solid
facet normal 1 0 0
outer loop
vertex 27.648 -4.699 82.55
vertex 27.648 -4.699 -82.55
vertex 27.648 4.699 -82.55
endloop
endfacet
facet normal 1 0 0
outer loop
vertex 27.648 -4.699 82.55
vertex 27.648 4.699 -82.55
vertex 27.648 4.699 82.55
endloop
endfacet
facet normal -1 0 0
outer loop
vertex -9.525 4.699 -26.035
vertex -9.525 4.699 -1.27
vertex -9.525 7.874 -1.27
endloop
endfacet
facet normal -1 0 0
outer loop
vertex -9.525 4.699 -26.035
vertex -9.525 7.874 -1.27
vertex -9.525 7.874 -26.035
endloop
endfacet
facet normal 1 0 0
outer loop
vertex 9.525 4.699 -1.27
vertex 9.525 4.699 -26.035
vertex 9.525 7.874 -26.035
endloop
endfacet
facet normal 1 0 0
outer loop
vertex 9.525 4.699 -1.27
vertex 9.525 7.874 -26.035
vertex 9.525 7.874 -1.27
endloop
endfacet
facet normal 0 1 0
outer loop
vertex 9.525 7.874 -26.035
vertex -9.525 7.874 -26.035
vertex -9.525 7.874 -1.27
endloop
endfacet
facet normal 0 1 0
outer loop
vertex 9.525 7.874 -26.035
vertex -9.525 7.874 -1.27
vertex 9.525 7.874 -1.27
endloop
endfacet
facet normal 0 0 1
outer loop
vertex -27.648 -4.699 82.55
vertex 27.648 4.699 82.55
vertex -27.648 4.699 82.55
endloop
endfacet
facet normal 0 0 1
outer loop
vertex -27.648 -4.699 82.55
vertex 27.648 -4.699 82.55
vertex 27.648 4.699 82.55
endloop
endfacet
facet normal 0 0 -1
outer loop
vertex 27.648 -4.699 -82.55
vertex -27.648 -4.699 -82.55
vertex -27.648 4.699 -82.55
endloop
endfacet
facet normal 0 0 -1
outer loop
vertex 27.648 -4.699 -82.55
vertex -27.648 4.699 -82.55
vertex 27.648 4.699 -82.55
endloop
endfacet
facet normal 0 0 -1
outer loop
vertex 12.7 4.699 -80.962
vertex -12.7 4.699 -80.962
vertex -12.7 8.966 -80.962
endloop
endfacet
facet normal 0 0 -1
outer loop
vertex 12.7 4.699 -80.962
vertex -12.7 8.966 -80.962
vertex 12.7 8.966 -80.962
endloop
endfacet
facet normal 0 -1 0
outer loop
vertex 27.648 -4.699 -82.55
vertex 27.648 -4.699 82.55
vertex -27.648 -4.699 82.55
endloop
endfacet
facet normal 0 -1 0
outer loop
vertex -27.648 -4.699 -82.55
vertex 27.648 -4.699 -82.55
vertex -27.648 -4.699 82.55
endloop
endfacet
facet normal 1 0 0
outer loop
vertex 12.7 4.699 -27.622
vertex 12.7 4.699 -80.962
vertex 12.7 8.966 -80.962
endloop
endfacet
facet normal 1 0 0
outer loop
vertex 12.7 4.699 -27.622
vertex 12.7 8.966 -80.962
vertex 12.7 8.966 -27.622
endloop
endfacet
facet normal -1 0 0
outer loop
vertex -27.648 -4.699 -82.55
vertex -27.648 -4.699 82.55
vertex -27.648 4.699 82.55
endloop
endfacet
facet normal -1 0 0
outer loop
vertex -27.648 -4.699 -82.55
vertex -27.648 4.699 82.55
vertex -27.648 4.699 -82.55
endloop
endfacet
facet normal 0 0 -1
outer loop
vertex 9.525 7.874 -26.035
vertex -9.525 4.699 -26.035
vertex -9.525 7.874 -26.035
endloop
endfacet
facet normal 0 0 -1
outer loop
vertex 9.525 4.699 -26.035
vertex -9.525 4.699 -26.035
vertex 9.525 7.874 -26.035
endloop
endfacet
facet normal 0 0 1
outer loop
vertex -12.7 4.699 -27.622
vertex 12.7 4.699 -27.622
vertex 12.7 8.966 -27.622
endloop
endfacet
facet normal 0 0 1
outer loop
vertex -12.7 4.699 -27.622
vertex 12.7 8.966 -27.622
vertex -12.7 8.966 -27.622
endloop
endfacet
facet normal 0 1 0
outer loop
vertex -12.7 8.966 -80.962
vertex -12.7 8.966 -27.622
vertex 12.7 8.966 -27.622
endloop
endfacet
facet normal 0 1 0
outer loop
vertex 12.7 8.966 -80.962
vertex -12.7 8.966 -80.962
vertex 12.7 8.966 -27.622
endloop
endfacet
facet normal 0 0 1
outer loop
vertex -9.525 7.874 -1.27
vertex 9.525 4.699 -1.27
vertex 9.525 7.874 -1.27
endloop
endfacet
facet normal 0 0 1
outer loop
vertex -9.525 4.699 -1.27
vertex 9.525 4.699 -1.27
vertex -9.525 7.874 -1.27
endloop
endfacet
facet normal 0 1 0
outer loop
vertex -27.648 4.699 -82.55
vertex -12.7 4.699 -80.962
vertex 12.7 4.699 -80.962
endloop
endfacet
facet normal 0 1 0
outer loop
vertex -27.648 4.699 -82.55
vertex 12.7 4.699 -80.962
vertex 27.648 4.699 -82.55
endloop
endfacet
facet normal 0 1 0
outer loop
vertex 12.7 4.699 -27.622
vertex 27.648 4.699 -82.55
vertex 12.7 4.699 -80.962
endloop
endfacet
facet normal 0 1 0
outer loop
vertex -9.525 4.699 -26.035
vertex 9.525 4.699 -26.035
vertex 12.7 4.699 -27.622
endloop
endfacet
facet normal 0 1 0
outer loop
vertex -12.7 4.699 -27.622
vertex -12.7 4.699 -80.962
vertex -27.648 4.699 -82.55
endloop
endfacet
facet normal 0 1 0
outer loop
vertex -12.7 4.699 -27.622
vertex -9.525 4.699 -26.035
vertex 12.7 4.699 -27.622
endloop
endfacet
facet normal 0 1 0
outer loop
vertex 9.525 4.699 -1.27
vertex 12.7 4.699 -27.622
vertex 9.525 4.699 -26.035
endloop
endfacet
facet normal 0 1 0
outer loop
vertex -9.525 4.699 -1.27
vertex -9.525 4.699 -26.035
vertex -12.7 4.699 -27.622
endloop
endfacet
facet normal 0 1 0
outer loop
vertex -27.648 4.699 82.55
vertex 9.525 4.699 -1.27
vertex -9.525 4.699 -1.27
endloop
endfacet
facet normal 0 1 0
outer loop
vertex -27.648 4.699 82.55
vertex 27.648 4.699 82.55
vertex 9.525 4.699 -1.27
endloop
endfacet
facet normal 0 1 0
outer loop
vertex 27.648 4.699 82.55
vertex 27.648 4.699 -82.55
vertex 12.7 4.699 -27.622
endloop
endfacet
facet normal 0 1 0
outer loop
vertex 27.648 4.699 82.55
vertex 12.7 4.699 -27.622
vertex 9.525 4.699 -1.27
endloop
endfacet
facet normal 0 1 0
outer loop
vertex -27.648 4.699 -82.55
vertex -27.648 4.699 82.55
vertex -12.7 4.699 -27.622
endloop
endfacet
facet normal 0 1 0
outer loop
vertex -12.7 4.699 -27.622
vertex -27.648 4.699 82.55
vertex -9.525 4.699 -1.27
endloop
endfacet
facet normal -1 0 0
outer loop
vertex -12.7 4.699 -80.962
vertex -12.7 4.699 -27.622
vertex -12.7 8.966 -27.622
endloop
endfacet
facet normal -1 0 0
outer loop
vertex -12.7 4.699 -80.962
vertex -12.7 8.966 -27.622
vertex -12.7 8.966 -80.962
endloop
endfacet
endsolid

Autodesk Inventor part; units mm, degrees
ref_plane "YZ Plane" through (0, 0, 0) normal (1, 0, 0) x (0, 1, 0)
ref_plane "XZ Plane" through (0, 0, 0) normal (0, 1, 0) x (-1, 0, 0)
ref_plane "XY Plane" through (0, 0, 0) normal (0, 0, 1) x (1, 0, 0)
sketch "Sketch1" plane through (0, 0, 0) normal (0, 1, 0) x (-1, 0, 0)
  line L0 (-27.6479, 82.55) -> (27.6479, 82.55)
  line L1 (27.6479, 82.55) -> (27.6479, -82.55)
  line L2 (27.6479, -82.55) -> (-27.6479, -82.55)
  line L3 (-27.6479, -82.55) -> (-27.6479, 82.55)
  line L4 (-27.6479, 82.55) -> (27.6479, -82.55) construction
  line L5 (27.6479, 82.55) -> (-27.6479, -82.55) construction
  point P0 (0, 0)
  dimension "BreadboardWidth" = 55.2958
  dimension "BreadboardLength" = 165.1
extrude "Breadboard" add sketch "Sketch1" along normal mid plane 9.398
sketch "Sketch2" plane through (0, 4.699, 0) normal (0, 1, 0) x (1, 0, 0)
  line L0 (12.7, 27.6225) -> (-12.7, 27.6225)
  line L1 (-12.7, 27.6225) -> (-12.7, 80.9625)
  line L2 (-12.7, 80.9625) -> (12.7, 80.9625)
  line L3 (12.7, 80.9625) -> (12.7, 27.6225)
  line L4 (12.7, 27.6225) -> (-12.7, 80.9625) construction
  line L5 (-12.7, 27.6225) -> (12.7, 80.9625) construction
  line L6 (27.6479, 82.55) -> (-27.6479, 82.55) projected
  point P0 (0, 0)
  point P1 (0, 54.2925)
  dimension "d4" = 25.4
  dimension "d5" = 53.34
  dimension "d6" = 1.5875
extrude "mBed" add sketch "Sketch2" along normal blind 4.2672
sketch "Sketch3" plane through (0, 4.699, 0) normal (0, 1, 0) x (1, 0, 0)
  line L0 (9.525, 1.27) -> (-9.525, 1.27)
  line L1 (-9.525, 1.27) -> (-9.525, 26.035)
  line L2 (-9.525, 26.035) -> (9.525, 26.035)
  line L3 (9.525, 26.035) -> (9.525, 1.27)
  line L4 (9.525, 1.27) -> (-9.525, 26.035) construction
  line L5 (-9.525, 1.27) -> (9.525, 26.035) construction
  line L6 (-12.7, 27.6225) -> (12.7, 27.6225) projected
  point P0 (0, 0)
  point P1 (0, 13.6525)
  dimension "d9" = 19.05
  dimension "d10" = 24.765
  dimension "d11" = 1.5875
extrude "Bluetooth Chip" add sketch "Sketch3" along normal blind 3.175
properties part number "Breadboard"
